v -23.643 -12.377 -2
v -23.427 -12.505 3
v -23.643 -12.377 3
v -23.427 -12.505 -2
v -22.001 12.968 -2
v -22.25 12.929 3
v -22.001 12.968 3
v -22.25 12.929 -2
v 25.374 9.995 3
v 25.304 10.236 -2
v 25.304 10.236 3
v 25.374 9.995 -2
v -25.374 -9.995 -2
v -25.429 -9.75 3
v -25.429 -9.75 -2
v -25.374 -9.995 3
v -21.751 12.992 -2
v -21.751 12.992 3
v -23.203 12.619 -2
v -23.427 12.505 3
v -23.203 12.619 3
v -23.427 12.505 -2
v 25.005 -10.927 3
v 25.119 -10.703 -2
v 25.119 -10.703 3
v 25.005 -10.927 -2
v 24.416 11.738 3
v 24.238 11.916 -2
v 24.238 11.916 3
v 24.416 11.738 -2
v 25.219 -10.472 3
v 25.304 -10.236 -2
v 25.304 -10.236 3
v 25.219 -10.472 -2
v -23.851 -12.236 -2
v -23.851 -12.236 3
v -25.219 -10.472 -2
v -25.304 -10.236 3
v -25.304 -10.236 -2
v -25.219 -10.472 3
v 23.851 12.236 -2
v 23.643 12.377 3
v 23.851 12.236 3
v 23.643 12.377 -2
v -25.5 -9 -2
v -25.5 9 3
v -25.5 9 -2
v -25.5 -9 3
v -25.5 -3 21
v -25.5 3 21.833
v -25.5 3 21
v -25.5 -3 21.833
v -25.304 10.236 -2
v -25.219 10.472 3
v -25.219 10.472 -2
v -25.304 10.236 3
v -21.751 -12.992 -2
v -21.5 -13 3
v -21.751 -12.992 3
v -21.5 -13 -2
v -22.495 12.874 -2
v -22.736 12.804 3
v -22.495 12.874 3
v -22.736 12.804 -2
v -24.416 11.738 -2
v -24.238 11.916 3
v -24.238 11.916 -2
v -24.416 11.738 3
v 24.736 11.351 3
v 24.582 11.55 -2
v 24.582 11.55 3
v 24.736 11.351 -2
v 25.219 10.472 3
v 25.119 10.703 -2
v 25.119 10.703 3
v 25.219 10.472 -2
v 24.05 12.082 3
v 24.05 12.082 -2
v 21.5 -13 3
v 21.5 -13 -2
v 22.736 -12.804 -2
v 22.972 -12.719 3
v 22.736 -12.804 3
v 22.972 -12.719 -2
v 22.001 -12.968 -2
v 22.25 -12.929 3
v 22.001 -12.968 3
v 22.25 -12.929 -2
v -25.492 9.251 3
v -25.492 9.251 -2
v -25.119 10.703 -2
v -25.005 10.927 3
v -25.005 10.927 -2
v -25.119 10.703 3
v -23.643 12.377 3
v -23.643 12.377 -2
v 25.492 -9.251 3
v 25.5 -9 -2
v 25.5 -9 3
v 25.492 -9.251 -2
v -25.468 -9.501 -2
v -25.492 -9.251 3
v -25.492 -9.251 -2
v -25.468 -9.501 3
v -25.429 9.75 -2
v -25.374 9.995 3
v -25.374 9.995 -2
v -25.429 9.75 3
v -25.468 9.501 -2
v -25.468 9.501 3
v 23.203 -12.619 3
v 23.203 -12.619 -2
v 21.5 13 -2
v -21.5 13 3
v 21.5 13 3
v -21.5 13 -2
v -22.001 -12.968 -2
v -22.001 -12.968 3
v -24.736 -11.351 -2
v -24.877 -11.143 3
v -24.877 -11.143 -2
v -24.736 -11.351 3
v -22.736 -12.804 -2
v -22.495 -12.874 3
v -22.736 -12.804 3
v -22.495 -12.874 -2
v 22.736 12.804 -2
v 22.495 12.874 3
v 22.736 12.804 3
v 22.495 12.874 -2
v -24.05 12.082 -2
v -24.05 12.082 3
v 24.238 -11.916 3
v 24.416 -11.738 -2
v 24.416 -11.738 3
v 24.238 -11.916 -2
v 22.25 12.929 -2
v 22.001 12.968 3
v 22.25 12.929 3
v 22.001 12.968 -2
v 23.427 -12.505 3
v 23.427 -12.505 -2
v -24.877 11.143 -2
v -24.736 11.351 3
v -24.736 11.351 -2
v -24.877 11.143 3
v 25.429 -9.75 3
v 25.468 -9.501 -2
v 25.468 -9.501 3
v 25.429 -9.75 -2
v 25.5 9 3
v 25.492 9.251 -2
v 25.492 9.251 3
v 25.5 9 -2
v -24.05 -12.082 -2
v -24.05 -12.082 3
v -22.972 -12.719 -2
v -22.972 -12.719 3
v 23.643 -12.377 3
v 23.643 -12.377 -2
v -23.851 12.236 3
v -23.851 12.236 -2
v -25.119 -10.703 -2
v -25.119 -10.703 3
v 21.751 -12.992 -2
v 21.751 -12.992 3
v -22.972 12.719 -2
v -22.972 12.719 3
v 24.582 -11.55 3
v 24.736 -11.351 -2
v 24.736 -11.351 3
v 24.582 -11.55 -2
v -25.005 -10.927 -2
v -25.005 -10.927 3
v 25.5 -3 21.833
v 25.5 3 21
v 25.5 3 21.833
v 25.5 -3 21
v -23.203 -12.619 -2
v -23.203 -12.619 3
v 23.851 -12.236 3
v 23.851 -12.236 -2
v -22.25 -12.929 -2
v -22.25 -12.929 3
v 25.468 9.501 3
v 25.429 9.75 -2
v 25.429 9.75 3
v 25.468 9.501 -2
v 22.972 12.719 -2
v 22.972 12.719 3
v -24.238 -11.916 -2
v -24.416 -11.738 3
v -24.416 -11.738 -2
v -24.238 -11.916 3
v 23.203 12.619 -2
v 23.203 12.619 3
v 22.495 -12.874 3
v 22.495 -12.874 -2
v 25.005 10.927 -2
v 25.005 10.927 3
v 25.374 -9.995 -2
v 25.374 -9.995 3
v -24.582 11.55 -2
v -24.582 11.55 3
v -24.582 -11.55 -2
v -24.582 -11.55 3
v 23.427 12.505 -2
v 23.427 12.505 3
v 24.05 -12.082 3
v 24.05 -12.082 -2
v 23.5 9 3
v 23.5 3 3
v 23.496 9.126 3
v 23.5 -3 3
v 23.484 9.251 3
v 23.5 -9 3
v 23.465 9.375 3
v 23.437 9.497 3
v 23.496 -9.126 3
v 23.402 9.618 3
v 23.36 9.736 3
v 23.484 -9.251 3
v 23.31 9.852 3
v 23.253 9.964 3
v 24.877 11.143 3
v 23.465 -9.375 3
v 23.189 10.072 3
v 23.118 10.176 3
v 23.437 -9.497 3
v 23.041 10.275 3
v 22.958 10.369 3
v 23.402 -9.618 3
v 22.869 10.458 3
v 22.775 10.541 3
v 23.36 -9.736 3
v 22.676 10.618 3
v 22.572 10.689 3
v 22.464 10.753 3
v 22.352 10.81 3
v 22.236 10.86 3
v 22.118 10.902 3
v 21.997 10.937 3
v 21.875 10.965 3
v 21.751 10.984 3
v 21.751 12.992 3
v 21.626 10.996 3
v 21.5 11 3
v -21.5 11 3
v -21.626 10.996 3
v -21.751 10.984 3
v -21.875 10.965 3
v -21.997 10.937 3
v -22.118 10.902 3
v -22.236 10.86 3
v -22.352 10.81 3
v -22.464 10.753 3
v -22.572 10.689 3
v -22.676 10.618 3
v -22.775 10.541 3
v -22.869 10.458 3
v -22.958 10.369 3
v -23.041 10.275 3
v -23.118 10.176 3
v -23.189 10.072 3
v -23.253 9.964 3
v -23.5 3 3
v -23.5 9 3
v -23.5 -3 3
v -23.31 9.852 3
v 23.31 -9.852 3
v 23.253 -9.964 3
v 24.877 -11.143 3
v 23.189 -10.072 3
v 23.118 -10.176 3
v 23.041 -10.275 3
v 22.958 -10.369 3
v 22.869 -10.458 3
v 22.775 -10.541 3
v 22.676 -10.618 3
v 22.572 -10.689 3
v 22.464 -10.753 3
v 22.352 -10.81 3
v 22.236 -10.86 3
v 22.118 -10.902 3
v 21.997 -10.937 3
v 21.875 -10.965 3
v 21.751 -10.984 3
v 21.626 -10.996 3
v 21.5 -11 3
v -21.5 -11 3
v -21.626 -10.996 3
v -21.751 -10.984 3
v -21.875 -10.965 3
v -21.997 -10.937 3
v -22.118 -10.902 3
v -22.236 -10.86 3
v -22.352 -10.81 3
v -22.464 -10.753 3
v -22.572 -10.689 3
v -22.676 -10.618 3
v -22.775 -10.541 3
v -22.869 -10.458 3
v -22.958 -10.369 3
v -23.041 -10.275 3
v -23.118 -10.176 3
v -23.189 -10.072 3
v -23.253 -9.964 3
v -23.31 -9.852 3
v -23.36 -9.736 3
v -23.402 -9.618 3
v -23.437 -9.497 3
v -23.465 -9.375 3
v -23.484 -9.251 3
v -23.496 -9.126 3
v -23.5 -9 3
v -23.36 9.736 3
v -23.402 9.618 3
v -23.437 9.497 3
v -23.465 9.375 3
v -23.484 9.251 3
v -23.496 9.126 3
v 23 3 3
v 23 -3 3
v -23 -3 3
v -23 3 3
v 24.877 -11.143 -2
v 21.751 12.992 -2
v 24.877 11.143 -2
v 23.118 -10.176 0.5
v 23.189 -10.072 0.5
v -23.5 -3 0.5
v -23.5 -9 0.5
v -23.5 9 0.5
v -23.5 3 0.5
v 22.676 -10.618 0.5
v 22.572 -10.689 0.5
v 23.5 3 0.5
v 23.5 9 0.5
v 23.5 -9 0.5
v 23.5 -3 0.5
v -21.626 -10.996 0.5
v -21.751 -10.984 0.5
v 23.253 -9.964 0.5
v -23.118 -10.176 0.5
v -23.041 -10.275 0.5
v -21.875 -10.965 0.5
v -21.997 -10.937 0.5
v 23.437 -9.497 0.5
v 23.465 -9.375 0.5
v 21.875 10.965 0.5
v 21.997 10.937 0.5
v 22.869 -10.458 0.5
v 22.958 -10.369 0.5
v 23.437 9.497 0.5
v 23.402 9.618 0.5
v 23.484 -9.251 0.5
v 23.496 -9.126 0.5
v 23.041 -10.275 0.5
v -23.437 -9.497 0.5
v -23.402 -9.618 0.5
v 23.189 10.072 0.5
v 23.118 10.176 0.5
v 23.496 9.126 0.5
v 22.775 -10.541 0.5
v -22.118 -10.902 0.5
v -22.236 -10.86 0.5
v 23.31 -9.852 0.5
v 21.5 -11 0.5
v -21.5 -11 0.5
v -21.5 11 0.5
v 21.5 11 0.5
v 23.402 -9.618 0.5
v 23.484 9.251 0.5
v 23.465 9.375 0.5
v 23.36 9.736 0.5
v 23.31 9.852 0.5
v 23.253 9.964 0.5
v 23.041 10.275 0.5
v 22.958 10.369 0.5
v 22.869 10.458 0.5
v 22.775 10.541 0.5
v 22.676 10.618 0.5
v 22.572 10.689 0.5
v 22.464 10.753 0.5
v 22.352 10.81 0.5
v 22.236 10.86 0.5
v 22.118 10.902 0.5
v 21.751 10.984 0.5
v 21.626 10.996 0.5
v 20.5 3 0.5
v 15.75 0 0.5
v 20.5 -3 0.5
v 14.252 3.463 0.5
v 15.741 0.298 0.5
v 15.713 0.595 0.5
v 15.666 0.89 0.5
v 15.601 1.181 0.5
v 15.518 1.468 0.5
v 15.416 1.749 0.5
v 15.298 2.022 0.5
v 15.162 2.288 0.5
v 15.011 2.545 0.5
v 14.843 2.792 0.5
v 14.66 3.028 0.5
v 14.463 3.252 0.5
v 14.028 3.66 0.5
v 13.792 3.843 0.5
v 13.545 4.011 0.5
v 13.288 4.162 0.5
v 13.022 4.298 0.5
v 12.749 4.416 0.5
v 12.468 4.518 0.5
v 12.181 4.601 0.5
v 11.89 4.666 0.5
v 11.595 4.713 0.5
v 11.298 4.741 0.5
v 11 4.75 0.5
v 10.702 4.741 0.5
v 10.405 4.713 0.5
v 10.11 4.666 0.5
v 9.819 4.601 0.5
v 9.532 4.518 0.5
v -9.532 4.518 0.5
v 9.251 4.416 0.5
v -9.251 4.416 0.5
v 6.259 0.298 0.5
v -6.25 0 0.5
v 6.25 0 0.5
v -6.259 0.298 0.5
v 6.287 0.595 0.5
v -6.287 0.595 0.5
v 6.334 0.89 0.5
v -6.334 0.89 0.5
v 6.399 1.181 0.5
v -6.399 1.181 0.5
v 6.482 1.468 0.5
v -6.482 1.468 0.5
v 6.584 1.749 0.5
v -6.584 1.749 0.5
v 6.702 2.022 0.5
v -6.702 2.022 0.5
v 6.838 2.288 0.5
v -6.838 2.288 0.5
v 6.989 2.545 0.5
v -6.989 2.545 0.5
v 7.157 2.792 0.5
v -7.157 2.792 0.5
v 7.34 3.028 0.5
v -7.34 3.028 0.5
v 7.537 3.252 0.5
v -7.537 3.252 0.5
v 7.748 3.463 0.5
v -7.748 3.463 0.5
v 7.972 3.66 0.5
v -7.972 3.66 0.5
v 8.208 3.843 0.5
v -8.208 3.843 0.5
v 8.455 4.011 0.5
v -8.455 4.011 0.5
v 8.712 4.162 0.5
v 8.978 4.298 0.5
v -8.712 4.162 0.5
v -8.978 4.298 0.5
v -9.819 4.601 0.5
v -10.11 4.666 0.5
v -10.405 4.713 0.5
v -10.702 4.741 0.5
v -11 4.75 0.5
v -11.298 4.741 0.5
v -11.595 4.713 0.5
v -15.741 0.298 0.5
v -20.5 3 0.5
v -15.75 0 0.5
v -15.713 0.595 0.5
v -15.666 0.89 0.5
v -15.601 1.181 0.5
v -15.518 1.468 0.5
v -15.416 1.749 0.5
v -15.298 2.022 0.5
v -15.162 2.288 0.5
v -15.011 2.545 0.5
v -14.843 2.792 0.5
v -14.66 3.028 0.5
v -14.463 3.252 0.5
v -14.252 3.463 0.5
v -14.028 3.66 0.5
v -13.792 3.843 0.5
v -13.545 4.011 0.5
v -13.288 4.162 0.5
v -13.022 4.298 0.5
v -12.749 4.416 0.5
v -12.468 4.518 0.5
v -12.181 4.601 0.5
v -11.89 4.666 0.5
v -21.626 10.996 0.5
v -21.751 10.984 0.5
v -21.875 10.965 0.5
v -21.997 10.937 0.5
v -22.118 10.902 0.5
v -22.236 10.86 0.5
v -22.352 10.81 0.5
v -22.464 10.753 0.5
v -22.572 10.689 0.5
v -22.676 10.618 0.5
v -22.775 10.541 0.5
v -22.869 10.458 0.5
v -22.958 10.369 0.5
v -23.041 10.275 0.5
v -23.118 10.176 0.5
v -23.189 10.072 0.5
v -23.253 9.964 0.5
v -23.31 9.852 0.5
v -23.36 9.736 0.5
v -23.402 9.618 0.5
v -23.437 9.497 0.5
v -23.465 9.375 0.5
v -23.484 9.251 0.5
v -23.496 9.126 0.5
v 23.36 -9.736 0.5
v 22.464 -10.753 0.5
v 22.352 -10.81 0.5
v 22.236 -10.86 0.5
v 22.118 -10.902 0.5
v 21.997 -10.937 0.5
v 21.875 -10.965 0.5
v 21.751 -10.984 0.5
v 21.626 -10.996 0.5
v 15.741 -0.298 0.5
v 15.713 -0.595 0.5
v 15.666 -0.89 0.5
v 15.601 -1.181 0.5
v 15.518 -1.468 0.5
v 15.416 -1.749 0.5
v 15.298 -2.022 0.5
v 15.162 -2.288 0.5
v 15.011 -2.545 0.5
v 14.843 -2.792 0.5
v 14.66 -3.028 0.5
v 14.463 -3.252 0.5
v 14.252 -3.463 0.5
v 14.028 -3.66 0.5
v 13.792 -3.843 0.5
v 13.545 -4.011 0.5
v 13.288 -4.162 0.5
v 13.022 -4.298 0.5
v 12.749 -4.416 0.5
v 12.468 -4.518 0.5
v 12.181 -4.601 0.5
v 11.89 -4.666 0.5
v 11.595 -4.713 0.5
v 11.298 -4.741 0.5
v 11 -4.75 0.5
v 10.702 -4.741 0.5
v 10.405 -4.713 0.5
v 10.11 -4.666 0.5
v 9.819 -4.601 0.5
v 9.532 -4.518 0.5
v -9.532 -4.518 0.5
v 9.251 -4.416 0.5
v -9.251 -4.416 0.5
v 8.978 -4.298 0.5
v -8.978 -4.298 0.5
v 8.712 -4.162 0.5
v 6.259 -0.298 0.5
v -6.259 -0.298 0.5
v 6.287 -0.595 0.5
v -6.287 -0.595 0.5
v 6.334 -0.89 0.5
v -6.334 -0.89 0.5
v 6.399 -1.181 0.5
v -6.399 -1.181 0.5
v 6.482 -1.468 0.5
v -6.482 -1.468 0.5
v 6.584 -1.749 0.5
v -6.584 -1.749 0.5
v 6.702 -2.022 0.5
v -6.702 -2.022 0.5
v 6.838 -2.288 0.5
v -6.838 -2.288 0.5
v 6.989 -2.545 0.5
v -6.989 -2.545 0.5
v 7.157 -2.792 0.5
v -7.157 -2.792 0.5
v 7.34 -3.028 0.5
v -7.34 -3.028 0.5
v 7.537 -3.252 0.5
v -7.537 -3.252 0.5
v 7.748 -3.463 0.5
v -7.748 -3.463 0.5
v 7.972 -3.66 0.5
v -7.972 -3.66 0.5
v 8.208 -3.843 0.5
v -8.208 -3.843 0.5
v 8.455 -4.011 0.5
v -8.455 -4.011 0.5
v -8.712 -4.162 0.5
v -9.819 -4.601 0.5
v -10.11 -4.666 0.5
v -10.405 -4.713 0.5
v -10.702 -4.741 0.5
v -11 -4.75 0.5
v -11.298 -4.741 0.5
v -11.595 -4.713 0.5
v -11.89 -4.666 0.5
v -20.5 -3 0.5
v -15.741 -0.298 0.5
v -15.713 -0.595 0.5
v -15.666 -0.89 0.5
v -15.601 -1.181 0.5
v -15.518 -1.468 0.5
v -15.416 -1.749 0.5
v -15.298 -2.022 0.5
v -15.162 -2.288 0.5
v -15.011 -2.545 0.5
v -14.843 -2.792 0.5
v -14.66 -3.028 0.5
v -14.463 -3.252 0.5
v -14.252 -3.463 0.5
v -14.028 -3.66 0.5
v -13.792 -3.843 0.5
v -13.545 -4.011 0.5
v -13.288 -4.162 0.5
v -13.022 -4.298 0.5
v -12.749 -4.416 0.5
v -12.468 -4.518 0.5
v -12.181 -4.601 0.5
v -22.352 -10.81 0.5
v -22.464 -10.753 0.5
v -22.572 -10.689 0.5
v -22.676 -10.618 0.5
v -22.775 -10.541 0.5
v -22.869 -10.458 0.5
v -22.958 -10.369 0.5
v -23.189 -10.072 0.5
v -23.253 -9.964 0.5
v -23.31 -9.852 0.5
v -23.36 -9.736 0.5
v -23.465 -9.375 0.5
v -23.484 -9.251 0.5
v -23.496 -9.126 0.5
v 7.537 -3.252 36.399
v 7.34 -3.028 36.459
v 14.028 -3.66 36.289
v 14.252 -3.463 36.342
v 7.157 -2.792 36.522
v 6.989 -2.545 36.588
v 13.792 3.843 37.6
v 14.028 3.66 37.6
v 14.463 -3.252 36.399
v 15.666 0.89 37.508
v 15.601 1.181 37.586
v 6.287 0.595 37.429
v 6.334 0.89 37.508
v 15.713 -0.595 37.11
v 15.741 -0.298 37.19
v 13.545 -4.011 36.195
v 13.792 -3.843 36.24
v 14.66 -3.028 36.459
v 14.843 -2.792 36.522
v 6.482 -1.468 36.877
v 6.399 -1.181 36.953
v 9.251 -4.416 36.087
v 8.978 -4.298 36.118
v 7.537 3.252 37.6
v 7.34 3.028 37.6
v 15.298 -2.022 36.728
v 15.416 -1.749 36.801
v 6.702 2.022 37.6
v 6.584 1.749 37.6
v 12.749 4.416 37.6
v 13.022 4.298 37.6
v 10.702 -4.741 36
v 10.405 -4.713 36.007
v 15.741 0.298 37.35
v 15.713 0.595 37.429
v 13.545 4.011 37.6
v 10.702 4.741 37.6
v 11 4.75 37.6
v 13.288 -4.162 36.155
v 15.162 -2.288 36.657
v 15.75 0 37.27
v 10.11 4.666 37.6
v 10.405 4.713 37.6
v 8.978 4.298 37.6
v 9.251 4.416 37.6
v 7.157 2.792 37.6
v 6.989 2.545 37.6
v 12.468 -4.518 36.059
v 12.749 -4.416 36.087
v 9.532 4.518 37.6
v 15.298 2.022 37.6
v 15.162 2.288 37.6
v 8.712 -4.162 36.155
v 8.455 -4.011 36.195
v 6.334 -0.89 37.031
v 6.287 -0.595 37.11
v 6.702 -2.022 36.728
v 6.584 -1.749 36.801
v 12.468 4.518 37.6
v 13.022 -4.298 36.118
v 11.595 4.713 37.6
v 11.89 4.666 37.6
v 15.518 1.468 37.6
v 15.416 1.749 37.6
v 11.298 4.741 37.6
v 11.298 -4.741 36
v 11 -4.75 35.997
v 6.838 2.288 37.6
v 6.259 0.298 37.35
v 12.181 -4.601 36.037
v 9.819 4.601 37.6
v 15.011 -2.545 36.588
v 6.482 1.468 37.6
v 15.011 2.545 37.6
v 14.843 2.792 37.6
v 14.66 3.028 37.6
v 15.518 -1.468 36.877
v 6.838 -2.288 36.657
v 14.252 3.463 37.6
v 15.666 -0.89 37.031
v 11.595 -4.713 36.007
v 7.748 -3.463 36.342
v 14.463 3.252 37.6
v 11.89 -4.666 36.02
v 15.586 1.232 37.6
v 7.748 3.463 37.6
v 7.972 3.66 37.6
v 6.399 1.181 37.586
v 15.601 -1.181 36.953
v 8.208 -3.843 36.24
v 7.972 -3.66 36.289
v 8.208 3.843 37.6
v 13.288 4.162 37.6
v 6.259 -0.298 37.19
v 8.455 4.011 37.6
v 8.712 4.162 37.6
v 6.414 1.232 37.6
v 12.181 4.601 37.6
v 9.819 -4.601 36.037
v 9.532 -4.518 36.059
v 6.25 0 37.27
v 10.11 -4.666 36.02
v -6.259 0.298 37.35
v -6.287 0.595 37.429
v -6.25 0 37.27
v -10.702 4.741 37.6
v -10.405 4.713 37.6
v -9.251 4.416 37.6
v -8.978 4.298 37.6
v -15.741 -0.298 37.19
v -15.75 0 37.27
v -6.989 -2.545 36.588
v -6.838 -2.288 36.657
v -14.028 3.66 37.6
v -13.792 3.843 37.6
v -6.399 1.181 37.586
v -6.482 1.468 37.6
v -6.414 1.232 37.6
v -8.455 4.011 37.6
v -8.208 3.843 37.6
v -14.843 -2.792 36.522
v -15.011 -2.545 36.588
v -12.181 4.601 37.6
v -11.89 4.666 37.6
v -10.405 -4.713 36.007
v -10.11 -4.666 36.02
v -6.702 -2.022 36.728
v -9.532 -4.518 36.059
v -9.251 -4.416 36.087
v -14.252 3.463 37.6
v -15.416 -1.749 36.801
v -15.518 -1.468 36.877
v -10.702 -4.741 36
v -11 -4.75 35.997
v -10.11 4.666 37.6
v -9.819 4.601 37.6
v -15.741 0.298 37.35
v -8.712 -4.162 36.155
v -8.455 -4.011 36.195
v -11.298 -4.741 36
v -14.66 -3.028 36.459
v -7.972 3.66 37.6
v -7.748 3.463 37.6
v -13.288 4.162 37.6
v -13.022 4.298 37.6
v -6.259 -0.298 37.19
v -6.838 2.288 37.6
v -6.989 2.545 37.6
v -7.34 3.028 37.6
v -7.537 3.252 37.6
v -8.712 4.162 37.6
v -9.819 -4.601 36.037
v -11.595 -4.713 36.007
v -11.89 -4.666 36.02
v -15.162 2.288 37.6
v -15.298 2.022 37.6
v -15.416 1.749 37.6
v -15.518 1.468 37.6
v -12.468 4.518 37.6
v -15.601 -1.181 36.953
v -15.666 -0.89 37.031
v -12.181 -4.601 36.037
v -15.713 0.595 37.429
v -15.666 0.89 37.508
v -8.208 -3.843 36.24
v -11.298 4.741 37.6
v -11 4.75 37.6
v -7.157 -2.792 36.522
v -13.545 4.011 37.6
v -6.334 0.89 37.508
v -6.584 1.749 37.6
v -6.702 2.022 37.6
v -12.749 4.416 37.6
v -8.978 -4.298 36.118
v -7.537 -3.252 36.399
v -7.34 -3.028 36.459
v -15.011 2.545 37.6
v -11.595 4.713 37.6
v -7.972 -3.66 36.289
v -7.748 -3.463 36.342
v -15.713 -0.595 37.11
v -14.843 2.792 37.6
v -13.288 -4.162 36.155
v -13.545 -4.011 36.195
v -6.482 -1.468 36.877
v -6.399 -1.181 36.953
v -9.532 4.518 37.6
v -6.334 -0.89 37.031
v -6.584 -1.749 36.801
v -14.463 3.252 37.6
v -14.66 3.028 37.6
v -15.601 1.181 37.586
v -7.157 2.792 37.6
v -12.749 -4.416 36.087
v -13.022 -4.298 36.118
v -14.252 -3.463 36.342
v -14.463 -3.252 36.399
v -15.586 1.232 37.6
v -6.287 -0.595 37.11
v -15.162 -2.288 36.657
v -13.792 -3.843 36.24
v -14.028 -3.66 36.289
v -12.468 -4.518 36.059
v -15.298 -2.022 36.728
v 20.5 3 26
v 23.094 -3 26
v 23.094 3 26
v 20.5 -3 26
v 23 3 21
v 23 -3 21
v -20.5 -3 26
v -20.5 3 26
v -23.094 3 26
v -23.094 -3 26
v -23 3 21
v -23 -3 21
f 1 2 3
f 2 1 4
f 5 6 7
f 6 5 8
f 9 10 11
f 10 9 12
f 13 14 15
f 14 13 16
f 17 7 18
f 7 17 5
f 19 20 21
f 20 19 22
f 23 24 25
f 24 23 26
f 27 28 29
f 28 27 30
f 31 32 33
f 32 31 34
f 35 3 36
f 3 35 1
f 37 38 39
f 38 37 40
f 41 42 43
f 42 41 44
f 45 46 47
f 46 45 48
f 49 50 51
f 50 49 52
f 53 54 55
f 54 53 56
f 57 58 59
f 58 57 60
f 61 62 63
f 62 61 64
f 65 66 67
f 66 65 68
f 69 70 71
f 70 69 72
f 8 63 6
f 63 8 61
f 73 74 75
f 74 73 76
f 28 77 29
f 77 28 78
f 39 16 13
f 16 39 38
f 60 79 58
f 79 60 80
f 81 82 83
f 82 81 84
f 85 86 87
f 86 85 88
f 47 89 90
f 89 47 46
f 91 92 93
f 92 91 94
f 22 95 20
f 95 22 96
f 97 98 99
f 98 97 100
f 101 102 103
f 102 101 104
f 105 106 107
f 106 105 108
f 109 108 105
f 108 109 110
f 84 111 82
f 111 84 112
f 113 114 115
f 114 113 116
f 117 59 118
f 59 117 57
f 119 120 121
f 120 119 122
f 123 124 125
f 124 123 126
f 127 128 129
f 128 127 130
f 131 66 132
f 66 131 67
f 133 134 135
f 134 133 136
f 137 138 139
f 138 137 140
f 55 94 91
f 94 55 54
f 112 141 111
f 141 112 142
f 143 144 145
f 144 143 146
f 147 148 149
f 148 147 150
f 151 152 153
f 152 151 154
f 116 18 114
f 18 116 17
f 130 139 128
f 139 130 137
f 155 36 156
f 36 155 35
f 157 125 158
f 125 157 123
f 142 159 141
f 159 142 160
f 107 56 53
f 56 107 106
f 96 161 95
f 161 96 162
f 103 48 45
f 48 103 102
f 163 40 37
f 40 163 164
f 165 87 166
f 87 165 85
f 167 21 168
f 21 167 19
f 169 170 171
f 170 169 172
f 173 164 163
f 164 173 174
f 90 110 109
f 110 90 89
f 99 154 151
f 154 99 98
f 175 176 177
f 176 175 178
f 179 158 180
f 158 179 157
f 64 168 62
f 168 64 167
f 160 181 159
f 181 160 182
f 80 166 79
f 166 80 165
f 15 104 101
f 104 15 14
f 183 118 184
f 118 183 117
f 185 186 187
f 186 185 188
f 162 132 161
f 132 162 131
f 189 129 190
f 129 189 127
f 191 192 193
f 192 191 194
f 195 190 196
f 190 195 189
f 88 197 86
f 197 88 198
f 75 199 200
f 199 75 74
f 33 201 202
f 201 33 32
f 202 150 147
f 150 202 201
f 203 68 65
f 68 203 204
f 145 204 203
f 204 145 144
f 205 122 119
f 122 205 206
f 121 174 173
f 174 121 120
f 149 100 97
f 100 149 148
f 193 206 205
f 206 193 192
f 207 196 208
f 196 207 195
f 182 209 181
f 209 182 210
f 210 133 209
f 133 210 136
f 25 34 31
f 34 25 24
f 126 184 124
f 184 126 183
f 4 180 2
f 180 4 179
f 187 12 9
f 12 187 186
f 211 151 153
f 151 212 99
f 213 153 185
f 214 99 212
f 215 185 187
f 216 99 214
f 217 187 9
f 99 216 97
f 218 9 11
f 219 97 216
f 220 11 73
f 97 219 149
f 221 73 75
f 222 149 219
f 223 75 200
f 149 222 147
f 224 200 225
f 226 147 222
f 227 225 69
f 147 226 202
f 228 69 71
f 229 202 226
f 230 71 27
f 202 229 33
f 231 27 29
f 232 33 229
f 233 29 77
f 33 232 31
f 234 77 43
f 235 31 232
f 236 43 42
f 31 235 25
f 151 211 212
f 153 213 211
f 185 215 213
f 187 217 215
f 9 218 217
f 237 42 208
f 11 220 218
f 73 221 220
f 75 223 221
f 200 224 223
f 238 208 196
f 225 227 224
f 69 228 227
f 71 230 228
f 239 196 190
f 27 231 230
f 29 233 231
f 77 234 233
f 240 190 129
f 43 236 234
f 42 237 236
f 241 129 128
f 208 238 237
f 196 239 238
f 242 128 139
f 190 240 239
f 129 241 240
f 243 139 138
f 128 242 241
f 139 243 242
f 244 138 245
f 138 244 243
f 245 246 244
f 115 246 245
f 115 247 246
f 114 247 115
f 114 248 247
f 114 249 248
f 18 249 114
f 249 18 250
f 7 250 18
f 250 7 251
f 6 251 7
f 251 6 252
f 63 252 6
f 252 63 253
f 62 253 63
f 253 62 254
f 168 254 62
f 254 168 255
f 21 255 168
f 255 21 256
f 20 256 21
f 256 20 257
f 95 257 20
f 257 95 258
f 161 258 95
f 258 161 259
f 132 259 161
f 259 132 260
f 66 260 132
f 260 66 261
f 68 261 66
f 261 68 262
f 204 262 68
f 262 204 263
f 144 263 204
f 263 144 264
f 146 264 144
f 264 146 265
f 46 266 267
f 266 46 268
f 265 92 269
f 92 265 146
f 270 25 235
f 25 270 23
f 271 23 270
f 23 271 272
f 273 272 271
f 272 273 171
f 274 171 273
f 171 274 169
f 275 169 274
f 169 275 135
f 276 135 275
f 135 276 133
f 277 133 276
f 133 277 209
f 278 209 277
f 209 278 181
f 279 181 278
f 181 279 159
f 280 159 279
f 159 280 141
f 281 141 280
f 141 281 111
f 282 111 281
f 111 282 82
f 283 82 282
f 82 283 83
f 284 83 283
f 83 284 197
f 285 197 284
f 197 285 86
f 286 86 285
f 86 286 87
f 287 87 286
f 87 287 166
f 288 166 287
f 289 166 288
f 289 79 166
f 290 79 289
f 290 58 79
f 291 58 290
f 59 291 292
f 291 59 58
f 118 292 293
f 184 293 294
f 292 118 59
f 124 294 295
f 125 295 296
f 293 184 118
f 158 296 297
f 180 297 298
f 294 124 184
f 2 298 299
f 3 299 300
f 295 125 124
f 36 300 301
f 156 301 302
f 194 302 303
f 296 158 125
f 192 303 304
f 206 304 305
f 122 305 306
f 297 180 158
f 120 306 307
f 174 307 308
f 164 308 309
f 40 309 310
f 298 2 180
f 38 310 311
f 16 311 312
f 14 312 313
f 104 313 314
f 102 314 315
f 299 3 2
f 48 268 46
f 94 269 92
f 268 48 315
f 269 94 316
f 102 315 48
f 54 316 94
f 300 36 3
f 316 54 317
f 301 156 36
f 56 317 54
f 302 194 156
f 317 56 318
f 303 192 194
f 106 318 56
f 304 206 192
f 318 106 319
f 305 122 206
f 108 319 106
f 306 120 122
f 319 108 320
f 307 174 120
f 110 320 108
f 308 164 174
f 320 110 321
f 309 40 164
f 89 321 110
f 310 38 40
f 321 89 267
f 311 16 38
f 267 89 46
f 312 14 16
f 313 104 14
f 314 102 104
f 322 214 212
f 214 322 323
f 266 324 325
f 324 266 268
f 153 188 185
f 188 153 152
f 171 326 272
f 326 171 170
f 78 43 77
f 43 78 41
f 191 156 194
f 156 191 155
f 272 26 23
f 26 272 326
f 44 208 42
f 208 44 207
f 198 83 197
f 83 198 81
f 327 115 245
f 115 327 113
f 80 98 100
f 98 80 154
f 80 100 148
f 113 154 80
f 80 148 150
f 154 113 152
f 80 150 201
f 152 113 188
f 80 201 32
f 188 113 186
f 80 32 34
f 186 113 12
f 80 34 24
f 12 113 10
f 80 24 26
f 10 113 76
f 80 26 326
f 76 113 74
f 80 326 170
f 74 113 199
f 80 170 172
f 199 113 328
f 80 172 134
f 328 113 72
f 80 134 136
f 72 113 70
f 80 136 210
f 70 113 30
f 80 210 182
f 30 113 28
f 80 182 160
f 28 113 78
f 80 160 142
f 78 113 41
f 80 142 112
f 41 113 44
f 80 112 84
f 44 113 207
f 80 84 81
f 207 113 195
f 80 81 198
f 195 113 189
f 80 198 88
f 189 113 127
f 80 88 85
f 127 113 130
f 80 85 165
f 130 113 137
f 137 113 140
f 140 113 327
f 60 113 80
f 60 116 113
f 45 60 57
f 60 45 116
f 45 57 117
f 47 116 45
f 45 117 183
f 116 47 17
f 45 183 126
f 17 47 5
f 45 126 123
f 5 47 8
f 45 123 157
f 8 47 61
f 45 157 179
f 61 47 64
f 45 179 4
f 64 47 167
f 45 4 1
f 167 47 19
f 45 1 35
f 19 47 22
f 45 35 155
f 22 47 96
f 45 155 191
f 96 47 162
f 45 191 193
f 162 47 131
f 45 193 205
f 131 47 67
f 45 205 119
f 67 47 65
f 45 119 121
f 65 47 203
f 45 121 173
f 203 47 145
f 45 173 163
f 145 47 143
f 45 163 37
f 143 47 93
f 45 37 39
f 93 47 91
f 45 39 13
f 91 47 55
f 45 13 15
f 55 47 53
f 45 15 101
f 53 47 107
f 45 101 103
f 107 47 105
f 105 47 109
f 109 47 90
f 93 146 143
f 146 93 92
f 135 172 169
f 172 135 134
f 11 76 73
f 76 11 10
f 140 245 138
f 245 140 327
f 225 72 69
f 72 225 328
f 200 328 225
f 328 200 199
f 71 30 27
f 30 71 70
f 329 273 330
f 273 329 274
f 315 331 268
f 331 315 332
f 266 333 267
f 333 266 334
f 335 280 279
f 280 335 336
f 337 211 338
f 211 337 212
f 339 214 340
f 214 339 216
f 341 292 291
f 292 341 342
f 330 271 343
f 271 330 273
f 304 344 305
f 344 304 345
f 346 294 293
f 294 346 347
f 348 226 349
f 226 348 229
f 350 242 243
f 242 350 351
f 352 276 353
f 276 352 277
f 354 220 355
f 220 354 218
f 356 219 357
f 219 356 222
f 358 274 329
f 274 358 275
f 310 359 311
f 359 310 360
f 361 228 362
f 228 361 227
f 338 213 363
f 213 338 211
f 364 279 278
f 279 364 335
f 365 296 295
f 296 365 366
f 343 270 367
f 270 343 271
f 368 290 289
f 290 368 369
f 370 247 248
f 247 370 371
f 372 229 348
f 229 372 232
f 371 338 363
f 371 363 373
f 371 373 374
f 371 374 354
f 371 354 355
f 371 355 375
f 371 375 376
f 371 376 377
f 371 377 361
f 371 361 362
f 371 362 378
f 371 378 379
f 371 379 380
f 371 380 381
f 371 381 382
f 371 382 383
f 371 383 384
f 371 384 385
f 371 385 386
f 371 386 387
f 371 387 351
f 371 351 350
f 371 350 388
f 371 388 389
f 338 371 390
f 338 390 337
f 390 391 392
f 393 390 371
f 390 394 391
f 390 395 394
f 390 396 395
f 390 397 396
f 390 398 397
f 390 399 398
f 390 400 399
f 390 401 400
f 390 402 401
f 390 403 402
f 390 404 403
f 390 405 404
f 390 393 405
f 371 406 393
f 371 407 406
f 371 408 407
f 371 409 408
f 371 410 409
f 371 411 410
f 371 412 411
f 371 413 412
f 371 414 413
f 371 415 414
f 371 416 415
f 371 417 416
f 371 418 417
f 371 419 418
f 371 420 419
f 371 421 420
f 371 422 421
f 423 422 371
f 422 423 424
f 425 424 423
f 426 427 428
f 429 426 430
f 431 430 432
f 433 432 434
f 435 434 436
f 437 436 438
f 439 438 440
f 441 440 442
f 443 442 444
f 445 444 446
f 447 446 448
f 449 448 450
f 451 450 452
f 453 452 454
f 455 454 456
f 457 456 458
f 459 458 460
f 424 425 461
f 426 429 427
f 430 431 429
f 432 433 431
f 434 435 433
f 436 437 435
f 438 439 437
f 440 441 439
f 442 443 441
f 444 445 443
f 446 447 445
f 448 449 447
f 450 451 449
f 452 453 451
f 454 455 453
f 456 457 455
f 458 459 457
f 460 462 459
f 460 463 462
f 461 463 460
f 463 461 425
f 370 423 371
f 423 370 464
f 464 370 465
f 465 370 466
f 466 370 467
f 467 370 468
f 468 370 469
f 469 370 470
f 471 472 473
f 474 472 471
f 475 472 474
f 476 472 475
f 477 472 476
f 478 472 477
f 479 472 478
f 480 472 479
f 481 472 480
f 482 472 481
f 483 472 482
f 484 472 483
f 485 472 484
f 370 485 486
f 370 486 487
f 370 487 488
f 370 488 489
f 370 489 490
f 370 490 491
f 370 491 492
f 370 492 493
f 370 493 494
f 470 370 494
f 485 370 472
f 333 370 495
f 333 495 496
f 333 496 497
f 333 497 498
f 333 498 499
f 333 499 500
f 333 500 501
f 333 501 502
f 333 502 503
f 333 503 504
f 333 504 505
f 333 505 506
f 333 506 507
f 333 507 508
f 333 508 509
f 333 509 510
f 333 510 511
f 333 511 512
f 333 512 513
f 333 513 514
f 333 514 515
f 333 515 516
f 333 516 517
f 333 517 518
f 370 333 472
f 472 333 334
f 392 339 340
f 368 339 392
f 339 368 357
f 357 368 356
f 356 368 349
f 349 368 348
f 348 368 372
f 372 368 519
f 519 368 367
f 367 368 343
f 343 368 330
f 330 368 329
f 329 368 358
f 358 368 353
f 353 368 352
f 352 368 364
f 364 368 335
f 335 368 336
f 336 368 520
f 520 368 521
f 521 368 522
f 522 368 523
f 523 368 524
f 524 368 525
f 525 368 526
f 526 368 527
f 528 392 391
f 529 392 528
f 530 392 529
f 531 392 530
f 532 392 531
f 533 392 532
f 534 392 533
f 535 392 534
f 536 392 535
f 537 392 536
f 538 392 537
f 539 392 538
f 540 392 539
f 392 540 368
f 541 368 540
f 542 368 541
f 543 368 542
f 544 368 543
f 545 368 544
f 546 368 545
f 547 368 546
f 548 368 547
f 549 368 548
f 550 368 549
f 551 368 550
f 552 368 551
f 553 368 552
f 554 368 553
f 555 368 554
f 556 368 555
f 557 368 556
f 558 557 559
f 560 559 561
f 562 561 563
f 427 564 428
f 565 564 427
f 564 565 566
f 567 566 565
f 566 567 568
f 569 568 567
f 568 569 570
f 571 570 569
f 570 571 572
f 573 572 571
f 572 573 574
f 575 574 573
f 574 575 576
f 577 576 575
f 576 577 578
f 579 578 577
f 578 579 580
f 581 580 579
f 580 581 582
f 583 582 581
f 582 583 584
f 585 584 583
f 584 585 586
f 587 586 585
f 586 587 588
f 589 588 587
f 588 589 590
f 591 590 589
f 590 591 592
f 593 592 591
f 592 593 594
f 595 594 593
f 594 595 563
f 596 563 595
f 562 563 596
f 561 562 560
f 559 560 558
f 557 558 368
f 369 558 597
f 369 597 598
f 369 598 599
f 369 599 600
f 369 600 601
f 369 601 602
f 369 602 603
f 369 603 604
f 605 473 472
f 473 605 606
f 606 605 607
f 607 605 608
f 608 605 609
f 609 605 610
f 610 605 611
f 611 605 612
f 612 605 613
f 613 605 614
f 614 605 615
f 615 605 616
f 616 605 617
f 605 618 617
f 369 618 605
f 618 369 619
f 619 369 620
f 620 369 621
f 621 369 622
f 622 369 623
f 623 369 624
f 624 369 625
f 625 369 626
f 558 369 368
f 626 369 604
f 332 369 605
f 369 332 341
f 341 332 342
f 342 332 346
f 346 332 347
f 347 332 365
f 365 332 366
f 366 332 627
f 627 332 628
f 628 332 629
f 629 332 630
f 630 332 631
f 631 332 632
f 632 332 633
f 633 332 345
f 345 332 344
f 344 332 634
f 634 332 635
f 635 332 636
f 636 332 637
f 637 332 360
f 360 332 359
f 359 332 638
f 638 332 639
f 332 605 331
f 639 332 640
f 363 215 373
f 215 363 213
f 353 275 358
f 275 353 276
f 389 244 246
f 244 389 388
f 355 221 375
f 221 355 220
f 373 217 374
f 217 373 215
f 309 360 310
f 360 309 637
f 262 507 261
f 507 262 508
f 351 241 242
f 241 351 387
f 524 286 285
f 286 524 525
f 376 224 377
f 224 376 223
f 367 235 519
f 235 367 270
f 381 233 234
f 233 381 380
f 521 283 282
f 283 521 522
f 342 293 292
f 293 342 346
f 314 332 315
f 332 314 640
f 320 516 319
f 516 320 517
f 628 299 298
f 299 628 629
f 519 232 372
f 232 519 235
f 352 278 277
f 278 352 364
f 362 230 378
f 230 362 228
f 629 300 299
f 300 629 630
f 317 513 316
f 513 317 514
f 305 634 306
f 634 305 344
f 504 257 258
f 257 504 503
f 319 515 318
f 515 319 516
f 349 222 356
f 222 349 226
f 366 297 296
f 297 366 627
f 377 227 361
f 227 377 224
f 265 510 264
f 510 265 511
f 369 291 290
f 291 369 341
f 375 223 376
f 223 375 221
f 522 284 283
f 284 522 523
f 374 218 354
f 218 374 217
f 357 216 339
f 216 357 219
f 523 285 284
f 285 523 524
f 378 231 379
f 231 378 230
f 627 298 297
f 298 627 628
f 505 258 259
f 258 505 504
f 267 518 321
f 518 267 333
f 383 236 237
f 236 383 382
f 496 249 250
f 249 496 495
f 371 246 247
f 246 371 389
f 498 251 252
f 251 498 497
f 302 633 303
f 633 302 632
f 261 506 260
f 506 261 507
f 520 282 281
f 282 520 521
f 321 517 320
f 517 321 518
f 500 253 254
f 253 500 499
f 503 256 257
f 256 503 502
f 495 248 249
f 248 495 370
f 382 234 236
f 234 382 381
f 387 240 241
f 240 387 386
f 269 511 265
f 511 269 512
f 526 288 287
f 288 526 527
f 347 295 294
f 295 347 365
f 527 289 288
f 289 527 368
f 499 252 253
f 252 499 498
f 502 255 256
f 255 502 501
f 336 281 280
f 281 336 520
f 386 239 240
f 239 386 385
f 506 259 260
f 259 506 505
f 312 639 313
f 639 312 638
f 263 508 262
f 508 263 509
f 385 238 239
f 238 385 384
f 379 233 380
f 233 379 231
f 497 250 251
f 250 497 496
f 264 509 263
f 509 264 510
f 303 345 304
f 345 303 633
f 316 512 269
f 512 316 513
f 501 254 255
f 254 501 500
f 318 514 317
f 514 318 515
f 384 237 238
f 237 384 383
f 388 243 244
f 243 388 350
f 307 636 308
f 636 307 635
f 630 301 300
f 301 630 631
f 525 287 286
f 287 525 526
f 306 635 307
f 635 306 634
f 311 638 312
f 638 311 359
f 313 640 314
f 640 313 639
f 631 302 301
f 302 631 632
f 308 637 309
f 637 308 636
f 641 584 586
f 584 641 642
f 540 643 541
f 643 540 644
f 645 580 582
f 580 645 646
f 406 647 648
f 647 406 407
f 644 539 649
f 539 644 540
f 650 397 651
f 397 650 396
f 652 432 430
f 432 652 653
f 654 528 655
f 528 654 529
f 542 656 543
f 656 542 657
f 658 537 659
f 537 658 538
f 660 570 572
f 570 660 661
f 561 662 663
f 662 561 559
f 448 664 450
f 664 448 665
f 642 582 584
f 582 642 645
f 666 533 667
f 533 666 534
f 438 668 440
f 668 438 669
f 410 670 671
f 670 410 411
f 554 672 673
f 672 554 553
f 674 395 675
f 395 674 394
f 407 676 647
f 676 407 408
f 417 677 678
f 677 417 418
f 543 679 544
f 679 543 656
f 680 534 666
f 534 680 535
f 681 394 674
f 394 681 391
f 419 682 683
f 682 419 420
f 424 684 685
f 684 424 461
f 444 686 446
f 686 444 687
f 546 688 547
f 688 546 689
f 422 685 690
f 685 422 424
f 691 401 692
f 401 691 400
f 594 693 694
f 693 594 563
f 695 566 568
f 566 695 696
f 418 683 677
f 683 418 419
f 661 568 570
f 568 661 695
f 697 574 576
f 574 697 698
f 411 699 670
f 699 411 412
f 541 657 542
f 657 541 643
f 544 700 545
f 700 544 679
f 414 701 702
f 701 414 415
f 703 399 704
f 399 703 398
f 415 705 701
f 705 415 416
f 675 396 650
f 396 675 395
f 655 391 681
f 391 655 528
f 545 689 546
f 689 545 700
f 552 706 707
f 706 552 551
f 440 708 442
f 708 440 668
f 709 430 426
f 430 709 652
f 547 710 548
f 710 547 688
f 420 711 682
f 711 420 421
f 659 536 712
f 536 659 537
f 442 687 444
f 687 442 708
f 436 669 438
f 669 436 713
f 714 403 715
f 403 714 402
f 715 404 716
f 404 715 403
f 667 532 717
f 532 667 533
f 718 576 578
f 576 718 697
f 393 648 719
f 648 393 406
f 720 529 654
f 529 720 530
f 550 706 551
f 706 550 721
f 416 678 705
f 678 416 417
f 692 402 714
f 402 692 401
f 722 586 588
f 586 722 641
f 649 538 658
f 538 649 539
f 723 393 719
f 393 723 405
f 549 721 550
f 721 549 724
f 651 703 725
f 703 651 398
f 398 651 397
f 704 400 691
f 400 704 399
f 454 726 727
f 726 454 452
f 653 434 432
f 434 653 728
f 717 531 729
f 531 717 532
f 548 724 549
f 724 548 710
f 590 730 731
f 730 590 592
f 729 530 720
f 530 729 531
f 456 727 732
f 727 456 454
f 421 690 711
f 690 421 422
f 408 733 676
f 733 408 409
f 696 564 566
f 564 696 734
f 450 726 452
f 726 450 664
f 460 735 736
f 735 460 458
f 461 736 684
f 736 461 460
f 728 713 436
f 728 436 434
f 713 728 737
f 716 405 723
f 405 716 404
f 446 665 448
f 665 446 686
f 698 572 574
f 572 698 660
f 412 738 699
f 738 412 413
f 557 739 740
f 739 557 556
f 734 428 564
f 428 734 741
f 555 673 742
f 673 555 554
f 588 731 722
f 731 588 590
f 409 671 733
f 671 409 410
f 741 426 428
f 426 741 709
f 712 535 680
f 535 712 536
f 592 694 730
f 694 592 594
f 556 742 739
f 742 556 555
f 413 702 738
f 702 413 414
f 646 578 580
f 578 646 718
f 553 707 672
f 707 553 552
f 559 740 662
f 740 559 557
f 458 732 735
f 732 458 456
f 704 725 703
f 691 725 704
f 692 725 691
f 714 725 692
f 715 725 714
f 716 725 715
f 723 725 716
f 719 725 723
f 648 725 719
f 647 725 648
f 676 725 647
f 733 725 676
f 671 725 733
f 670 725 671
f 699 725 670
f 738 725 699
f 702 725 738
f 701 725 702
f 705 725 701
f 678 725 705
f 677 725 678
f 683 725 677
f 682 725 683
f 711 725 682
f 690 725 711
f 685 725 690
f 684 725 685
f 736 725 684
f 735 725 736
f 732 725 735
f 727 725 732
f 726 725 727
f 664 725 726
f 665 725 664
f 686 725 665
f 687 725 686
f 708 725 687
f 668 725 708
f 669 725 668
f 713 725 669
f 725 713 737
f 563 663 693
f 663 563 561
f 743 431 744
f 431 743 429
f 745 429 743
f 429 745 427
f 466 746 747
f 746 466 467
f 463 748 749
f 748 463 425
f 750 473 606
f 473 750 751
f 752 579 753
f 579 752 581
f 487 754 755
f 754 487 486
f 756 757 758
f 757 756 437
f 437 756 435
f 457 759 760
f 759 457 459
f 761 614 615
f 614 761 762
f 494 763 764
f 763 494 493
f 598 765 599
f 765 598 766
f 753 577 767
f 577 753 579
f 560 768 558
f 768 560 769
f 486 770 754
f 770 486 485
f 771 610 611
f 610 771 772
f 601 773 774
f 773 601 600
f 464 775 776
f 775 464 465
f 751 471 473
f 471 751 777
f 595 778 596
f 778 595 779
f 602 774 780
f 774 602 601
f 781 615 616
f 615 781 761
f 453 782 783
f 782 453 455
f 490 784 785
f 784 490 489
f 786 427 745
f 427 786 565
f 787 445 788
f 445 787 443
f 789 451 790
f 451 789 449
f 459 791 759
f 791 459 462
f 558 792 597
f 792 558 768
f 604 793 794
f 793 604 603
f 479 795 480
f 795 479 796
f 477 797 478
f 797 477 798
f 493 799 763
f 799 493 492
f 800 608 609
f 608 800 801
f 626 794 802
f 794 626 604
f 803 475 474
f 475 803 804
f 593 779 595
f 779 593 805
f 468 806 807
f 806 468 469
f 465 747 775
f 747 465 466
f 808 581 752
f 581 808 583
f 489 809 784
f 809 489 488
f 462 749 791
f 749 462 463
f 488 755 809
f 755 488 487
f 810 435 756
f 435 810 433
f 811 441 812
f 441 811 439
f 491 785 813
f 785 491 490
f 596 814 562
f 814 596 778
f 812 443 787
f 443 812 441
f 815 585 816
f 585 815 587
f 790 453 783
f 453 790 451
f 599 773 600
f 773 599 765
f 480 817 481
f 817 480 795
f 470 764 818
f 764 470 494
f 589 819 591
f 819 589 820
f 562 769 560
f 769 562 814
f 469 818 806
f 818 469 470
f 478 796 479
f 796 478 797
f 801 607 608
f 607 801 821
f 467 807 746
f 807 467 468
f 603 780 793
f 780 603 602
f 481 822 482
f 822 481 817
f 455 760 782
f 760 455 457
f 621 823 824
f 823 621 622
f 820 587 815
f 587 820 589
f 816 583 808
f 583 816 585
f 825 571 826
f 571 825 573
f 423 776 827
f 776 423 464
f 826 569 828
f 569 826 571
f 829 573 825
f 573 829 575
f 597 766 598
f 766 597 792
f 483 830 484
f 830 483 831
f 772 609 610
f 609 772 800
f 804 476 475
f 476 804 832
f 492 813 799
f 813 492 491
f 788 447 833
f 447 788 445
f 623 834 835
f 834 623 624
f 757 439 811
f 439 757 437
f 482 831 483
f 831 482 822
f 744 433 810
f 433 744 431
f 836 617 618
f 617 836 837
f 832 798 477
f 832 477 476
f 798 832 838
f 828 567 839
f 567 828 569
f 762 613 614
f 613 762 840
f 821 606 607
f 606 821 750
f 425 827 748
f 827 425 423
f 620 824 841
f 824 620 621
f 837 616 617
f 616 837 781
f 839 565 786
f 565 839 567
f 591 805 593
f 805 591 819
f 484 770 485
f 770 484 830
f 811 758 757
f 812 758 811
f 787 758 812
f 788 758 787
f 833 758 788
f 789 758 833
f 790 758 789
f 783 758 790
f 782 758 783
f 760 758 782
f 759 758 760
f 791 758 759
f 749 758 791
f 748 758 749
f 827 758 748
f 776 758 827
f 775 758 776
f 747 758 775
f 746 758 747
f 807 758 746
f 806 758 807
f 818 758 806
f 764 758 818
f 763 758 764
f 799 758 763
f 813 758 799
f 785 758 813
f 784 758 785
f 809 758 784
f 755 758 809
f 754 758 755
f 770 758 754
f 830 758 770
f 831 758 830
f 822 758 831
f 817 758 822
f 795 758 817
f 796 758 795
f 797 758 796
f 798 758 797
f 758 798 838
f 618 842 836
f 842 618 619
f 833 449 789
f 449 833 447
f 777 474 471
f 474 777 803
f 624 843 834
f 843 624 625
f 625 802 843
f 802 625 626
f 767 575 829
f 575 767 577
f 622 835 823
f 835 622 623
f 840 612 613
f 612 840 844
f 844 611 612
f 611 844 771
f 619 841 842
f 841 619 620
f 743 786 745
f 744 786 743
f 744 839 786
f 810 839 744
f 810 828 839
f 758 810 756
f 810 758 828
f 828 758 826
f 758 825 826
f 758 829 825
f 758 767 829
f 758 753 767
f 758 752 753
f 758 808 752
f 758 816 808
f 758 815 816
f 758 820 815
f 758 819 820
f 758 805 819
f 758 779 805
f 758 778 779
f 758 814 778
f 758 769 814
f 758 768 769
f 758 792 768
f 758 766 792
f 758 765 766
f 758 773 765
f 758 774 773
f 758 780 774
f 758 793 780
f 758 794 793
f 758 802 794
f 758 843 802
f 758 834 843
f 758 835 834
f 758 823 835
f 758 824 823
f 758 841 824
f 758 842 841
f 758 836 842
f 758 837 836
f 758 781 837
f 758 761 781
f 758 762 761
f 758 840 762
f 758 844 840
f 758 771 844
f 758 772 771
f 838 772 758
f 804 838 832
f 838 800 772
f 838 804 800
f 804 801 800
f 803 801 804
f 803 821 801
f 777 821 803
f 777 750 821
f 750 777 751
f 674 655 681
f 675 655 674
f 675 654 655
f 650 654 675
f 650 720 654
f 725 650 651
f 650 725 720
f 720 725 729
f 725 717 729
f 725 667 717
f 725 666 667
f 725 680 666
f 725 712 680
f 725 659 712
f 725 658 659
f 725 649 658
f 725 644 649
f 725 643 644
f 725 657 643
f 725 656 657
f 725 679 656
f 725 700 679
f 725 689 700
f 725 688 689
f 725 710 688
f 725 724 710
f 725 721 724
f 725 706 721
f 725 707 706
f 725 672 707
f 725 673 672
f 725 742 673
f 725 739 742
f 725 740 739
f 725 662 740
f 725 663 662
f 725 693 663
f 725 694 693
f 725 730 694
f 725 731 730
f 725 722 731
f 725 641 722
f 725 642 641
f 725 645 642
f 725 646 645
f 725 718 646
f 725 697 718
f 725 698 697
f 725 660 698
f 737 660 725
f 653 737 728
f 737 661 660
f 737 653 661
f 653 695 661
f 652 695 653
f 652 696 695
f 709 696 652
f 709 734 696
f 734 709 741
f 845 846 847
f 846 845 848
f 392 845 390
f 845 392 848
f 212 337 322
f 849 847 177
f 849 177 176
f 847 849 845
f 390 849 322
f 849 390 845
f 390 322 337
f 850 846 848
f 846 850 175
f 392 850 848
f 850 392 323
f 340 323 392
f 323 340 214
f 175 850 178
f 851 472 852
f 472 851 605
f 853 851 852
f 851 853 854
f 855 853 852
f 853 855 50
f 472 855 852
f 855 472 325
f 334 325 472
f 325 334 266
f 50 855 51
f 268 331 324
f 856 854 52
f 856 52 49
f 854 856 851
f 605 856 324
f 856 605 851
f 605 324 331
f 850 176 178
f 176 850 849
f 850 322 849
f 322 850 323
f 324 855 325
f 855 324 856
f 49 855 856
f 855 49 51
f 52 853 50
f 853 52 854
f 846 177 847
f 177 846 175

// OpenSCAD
$fn=100;
difference(){
    //зададим подложку из которой будем вырезать всё "лишнее"
minkowski()
{ cube([43,18,4],true);
  cylinder(r=4,h=1); }
  //получился кубик со стороной Z мм (x+2r: y+2r) и скругленными (на r)гранями
  //теперь то что вырезаем склеим в одну фигуру
 union () { 
 // кубоцилиндр смещаем на радиус цилиндра (r), чтобы расположить по центру первого
translate ([0,0,3]) #minkowski()
{ cube([43,18,5],true);
  cylinder(r=2,h=1); }
} 
}
// добавляем толкатели
difference(){
 union () {
rotate ([0,0,0]) translate ([11,0,0]) cylinder(r=4.75,h=37.6);
rotate ([0,0,0]) translate ([-11,0,0]) cylinder(r=4.75,h=37.6);}
// делаем скос для беспроблемного возврата опорной пластины замка дверцы
  #rotate ([0,-105,90]) translate ([38.5,0,0]) cube([5,60,40],true); }

// добавляем фиксаторы
difference(){
 union () {
    rotate ([0,0,0]) translate ([23,0,13]) cube([5,6,26],true);
    rotate ([0,0,0]) translate ([-23,0,13]) cube([5,6,26],true); } 
  // отрезаем лишнее    
  #rotate ([0,0,0]) translate ([25,0,12]) cube([4,6,18],true);
  #rotate ([0,0,0]) translate ([-25,0,12]) cube([4,6,18],true);  
  #rotate ([0,30,0]) translate ([-35,0,12]) cube([4,6,18],true);   
  #rotate ([0,-30,0]) translate ([35,0,12]) cube([4,6,18],true);     
 
}
